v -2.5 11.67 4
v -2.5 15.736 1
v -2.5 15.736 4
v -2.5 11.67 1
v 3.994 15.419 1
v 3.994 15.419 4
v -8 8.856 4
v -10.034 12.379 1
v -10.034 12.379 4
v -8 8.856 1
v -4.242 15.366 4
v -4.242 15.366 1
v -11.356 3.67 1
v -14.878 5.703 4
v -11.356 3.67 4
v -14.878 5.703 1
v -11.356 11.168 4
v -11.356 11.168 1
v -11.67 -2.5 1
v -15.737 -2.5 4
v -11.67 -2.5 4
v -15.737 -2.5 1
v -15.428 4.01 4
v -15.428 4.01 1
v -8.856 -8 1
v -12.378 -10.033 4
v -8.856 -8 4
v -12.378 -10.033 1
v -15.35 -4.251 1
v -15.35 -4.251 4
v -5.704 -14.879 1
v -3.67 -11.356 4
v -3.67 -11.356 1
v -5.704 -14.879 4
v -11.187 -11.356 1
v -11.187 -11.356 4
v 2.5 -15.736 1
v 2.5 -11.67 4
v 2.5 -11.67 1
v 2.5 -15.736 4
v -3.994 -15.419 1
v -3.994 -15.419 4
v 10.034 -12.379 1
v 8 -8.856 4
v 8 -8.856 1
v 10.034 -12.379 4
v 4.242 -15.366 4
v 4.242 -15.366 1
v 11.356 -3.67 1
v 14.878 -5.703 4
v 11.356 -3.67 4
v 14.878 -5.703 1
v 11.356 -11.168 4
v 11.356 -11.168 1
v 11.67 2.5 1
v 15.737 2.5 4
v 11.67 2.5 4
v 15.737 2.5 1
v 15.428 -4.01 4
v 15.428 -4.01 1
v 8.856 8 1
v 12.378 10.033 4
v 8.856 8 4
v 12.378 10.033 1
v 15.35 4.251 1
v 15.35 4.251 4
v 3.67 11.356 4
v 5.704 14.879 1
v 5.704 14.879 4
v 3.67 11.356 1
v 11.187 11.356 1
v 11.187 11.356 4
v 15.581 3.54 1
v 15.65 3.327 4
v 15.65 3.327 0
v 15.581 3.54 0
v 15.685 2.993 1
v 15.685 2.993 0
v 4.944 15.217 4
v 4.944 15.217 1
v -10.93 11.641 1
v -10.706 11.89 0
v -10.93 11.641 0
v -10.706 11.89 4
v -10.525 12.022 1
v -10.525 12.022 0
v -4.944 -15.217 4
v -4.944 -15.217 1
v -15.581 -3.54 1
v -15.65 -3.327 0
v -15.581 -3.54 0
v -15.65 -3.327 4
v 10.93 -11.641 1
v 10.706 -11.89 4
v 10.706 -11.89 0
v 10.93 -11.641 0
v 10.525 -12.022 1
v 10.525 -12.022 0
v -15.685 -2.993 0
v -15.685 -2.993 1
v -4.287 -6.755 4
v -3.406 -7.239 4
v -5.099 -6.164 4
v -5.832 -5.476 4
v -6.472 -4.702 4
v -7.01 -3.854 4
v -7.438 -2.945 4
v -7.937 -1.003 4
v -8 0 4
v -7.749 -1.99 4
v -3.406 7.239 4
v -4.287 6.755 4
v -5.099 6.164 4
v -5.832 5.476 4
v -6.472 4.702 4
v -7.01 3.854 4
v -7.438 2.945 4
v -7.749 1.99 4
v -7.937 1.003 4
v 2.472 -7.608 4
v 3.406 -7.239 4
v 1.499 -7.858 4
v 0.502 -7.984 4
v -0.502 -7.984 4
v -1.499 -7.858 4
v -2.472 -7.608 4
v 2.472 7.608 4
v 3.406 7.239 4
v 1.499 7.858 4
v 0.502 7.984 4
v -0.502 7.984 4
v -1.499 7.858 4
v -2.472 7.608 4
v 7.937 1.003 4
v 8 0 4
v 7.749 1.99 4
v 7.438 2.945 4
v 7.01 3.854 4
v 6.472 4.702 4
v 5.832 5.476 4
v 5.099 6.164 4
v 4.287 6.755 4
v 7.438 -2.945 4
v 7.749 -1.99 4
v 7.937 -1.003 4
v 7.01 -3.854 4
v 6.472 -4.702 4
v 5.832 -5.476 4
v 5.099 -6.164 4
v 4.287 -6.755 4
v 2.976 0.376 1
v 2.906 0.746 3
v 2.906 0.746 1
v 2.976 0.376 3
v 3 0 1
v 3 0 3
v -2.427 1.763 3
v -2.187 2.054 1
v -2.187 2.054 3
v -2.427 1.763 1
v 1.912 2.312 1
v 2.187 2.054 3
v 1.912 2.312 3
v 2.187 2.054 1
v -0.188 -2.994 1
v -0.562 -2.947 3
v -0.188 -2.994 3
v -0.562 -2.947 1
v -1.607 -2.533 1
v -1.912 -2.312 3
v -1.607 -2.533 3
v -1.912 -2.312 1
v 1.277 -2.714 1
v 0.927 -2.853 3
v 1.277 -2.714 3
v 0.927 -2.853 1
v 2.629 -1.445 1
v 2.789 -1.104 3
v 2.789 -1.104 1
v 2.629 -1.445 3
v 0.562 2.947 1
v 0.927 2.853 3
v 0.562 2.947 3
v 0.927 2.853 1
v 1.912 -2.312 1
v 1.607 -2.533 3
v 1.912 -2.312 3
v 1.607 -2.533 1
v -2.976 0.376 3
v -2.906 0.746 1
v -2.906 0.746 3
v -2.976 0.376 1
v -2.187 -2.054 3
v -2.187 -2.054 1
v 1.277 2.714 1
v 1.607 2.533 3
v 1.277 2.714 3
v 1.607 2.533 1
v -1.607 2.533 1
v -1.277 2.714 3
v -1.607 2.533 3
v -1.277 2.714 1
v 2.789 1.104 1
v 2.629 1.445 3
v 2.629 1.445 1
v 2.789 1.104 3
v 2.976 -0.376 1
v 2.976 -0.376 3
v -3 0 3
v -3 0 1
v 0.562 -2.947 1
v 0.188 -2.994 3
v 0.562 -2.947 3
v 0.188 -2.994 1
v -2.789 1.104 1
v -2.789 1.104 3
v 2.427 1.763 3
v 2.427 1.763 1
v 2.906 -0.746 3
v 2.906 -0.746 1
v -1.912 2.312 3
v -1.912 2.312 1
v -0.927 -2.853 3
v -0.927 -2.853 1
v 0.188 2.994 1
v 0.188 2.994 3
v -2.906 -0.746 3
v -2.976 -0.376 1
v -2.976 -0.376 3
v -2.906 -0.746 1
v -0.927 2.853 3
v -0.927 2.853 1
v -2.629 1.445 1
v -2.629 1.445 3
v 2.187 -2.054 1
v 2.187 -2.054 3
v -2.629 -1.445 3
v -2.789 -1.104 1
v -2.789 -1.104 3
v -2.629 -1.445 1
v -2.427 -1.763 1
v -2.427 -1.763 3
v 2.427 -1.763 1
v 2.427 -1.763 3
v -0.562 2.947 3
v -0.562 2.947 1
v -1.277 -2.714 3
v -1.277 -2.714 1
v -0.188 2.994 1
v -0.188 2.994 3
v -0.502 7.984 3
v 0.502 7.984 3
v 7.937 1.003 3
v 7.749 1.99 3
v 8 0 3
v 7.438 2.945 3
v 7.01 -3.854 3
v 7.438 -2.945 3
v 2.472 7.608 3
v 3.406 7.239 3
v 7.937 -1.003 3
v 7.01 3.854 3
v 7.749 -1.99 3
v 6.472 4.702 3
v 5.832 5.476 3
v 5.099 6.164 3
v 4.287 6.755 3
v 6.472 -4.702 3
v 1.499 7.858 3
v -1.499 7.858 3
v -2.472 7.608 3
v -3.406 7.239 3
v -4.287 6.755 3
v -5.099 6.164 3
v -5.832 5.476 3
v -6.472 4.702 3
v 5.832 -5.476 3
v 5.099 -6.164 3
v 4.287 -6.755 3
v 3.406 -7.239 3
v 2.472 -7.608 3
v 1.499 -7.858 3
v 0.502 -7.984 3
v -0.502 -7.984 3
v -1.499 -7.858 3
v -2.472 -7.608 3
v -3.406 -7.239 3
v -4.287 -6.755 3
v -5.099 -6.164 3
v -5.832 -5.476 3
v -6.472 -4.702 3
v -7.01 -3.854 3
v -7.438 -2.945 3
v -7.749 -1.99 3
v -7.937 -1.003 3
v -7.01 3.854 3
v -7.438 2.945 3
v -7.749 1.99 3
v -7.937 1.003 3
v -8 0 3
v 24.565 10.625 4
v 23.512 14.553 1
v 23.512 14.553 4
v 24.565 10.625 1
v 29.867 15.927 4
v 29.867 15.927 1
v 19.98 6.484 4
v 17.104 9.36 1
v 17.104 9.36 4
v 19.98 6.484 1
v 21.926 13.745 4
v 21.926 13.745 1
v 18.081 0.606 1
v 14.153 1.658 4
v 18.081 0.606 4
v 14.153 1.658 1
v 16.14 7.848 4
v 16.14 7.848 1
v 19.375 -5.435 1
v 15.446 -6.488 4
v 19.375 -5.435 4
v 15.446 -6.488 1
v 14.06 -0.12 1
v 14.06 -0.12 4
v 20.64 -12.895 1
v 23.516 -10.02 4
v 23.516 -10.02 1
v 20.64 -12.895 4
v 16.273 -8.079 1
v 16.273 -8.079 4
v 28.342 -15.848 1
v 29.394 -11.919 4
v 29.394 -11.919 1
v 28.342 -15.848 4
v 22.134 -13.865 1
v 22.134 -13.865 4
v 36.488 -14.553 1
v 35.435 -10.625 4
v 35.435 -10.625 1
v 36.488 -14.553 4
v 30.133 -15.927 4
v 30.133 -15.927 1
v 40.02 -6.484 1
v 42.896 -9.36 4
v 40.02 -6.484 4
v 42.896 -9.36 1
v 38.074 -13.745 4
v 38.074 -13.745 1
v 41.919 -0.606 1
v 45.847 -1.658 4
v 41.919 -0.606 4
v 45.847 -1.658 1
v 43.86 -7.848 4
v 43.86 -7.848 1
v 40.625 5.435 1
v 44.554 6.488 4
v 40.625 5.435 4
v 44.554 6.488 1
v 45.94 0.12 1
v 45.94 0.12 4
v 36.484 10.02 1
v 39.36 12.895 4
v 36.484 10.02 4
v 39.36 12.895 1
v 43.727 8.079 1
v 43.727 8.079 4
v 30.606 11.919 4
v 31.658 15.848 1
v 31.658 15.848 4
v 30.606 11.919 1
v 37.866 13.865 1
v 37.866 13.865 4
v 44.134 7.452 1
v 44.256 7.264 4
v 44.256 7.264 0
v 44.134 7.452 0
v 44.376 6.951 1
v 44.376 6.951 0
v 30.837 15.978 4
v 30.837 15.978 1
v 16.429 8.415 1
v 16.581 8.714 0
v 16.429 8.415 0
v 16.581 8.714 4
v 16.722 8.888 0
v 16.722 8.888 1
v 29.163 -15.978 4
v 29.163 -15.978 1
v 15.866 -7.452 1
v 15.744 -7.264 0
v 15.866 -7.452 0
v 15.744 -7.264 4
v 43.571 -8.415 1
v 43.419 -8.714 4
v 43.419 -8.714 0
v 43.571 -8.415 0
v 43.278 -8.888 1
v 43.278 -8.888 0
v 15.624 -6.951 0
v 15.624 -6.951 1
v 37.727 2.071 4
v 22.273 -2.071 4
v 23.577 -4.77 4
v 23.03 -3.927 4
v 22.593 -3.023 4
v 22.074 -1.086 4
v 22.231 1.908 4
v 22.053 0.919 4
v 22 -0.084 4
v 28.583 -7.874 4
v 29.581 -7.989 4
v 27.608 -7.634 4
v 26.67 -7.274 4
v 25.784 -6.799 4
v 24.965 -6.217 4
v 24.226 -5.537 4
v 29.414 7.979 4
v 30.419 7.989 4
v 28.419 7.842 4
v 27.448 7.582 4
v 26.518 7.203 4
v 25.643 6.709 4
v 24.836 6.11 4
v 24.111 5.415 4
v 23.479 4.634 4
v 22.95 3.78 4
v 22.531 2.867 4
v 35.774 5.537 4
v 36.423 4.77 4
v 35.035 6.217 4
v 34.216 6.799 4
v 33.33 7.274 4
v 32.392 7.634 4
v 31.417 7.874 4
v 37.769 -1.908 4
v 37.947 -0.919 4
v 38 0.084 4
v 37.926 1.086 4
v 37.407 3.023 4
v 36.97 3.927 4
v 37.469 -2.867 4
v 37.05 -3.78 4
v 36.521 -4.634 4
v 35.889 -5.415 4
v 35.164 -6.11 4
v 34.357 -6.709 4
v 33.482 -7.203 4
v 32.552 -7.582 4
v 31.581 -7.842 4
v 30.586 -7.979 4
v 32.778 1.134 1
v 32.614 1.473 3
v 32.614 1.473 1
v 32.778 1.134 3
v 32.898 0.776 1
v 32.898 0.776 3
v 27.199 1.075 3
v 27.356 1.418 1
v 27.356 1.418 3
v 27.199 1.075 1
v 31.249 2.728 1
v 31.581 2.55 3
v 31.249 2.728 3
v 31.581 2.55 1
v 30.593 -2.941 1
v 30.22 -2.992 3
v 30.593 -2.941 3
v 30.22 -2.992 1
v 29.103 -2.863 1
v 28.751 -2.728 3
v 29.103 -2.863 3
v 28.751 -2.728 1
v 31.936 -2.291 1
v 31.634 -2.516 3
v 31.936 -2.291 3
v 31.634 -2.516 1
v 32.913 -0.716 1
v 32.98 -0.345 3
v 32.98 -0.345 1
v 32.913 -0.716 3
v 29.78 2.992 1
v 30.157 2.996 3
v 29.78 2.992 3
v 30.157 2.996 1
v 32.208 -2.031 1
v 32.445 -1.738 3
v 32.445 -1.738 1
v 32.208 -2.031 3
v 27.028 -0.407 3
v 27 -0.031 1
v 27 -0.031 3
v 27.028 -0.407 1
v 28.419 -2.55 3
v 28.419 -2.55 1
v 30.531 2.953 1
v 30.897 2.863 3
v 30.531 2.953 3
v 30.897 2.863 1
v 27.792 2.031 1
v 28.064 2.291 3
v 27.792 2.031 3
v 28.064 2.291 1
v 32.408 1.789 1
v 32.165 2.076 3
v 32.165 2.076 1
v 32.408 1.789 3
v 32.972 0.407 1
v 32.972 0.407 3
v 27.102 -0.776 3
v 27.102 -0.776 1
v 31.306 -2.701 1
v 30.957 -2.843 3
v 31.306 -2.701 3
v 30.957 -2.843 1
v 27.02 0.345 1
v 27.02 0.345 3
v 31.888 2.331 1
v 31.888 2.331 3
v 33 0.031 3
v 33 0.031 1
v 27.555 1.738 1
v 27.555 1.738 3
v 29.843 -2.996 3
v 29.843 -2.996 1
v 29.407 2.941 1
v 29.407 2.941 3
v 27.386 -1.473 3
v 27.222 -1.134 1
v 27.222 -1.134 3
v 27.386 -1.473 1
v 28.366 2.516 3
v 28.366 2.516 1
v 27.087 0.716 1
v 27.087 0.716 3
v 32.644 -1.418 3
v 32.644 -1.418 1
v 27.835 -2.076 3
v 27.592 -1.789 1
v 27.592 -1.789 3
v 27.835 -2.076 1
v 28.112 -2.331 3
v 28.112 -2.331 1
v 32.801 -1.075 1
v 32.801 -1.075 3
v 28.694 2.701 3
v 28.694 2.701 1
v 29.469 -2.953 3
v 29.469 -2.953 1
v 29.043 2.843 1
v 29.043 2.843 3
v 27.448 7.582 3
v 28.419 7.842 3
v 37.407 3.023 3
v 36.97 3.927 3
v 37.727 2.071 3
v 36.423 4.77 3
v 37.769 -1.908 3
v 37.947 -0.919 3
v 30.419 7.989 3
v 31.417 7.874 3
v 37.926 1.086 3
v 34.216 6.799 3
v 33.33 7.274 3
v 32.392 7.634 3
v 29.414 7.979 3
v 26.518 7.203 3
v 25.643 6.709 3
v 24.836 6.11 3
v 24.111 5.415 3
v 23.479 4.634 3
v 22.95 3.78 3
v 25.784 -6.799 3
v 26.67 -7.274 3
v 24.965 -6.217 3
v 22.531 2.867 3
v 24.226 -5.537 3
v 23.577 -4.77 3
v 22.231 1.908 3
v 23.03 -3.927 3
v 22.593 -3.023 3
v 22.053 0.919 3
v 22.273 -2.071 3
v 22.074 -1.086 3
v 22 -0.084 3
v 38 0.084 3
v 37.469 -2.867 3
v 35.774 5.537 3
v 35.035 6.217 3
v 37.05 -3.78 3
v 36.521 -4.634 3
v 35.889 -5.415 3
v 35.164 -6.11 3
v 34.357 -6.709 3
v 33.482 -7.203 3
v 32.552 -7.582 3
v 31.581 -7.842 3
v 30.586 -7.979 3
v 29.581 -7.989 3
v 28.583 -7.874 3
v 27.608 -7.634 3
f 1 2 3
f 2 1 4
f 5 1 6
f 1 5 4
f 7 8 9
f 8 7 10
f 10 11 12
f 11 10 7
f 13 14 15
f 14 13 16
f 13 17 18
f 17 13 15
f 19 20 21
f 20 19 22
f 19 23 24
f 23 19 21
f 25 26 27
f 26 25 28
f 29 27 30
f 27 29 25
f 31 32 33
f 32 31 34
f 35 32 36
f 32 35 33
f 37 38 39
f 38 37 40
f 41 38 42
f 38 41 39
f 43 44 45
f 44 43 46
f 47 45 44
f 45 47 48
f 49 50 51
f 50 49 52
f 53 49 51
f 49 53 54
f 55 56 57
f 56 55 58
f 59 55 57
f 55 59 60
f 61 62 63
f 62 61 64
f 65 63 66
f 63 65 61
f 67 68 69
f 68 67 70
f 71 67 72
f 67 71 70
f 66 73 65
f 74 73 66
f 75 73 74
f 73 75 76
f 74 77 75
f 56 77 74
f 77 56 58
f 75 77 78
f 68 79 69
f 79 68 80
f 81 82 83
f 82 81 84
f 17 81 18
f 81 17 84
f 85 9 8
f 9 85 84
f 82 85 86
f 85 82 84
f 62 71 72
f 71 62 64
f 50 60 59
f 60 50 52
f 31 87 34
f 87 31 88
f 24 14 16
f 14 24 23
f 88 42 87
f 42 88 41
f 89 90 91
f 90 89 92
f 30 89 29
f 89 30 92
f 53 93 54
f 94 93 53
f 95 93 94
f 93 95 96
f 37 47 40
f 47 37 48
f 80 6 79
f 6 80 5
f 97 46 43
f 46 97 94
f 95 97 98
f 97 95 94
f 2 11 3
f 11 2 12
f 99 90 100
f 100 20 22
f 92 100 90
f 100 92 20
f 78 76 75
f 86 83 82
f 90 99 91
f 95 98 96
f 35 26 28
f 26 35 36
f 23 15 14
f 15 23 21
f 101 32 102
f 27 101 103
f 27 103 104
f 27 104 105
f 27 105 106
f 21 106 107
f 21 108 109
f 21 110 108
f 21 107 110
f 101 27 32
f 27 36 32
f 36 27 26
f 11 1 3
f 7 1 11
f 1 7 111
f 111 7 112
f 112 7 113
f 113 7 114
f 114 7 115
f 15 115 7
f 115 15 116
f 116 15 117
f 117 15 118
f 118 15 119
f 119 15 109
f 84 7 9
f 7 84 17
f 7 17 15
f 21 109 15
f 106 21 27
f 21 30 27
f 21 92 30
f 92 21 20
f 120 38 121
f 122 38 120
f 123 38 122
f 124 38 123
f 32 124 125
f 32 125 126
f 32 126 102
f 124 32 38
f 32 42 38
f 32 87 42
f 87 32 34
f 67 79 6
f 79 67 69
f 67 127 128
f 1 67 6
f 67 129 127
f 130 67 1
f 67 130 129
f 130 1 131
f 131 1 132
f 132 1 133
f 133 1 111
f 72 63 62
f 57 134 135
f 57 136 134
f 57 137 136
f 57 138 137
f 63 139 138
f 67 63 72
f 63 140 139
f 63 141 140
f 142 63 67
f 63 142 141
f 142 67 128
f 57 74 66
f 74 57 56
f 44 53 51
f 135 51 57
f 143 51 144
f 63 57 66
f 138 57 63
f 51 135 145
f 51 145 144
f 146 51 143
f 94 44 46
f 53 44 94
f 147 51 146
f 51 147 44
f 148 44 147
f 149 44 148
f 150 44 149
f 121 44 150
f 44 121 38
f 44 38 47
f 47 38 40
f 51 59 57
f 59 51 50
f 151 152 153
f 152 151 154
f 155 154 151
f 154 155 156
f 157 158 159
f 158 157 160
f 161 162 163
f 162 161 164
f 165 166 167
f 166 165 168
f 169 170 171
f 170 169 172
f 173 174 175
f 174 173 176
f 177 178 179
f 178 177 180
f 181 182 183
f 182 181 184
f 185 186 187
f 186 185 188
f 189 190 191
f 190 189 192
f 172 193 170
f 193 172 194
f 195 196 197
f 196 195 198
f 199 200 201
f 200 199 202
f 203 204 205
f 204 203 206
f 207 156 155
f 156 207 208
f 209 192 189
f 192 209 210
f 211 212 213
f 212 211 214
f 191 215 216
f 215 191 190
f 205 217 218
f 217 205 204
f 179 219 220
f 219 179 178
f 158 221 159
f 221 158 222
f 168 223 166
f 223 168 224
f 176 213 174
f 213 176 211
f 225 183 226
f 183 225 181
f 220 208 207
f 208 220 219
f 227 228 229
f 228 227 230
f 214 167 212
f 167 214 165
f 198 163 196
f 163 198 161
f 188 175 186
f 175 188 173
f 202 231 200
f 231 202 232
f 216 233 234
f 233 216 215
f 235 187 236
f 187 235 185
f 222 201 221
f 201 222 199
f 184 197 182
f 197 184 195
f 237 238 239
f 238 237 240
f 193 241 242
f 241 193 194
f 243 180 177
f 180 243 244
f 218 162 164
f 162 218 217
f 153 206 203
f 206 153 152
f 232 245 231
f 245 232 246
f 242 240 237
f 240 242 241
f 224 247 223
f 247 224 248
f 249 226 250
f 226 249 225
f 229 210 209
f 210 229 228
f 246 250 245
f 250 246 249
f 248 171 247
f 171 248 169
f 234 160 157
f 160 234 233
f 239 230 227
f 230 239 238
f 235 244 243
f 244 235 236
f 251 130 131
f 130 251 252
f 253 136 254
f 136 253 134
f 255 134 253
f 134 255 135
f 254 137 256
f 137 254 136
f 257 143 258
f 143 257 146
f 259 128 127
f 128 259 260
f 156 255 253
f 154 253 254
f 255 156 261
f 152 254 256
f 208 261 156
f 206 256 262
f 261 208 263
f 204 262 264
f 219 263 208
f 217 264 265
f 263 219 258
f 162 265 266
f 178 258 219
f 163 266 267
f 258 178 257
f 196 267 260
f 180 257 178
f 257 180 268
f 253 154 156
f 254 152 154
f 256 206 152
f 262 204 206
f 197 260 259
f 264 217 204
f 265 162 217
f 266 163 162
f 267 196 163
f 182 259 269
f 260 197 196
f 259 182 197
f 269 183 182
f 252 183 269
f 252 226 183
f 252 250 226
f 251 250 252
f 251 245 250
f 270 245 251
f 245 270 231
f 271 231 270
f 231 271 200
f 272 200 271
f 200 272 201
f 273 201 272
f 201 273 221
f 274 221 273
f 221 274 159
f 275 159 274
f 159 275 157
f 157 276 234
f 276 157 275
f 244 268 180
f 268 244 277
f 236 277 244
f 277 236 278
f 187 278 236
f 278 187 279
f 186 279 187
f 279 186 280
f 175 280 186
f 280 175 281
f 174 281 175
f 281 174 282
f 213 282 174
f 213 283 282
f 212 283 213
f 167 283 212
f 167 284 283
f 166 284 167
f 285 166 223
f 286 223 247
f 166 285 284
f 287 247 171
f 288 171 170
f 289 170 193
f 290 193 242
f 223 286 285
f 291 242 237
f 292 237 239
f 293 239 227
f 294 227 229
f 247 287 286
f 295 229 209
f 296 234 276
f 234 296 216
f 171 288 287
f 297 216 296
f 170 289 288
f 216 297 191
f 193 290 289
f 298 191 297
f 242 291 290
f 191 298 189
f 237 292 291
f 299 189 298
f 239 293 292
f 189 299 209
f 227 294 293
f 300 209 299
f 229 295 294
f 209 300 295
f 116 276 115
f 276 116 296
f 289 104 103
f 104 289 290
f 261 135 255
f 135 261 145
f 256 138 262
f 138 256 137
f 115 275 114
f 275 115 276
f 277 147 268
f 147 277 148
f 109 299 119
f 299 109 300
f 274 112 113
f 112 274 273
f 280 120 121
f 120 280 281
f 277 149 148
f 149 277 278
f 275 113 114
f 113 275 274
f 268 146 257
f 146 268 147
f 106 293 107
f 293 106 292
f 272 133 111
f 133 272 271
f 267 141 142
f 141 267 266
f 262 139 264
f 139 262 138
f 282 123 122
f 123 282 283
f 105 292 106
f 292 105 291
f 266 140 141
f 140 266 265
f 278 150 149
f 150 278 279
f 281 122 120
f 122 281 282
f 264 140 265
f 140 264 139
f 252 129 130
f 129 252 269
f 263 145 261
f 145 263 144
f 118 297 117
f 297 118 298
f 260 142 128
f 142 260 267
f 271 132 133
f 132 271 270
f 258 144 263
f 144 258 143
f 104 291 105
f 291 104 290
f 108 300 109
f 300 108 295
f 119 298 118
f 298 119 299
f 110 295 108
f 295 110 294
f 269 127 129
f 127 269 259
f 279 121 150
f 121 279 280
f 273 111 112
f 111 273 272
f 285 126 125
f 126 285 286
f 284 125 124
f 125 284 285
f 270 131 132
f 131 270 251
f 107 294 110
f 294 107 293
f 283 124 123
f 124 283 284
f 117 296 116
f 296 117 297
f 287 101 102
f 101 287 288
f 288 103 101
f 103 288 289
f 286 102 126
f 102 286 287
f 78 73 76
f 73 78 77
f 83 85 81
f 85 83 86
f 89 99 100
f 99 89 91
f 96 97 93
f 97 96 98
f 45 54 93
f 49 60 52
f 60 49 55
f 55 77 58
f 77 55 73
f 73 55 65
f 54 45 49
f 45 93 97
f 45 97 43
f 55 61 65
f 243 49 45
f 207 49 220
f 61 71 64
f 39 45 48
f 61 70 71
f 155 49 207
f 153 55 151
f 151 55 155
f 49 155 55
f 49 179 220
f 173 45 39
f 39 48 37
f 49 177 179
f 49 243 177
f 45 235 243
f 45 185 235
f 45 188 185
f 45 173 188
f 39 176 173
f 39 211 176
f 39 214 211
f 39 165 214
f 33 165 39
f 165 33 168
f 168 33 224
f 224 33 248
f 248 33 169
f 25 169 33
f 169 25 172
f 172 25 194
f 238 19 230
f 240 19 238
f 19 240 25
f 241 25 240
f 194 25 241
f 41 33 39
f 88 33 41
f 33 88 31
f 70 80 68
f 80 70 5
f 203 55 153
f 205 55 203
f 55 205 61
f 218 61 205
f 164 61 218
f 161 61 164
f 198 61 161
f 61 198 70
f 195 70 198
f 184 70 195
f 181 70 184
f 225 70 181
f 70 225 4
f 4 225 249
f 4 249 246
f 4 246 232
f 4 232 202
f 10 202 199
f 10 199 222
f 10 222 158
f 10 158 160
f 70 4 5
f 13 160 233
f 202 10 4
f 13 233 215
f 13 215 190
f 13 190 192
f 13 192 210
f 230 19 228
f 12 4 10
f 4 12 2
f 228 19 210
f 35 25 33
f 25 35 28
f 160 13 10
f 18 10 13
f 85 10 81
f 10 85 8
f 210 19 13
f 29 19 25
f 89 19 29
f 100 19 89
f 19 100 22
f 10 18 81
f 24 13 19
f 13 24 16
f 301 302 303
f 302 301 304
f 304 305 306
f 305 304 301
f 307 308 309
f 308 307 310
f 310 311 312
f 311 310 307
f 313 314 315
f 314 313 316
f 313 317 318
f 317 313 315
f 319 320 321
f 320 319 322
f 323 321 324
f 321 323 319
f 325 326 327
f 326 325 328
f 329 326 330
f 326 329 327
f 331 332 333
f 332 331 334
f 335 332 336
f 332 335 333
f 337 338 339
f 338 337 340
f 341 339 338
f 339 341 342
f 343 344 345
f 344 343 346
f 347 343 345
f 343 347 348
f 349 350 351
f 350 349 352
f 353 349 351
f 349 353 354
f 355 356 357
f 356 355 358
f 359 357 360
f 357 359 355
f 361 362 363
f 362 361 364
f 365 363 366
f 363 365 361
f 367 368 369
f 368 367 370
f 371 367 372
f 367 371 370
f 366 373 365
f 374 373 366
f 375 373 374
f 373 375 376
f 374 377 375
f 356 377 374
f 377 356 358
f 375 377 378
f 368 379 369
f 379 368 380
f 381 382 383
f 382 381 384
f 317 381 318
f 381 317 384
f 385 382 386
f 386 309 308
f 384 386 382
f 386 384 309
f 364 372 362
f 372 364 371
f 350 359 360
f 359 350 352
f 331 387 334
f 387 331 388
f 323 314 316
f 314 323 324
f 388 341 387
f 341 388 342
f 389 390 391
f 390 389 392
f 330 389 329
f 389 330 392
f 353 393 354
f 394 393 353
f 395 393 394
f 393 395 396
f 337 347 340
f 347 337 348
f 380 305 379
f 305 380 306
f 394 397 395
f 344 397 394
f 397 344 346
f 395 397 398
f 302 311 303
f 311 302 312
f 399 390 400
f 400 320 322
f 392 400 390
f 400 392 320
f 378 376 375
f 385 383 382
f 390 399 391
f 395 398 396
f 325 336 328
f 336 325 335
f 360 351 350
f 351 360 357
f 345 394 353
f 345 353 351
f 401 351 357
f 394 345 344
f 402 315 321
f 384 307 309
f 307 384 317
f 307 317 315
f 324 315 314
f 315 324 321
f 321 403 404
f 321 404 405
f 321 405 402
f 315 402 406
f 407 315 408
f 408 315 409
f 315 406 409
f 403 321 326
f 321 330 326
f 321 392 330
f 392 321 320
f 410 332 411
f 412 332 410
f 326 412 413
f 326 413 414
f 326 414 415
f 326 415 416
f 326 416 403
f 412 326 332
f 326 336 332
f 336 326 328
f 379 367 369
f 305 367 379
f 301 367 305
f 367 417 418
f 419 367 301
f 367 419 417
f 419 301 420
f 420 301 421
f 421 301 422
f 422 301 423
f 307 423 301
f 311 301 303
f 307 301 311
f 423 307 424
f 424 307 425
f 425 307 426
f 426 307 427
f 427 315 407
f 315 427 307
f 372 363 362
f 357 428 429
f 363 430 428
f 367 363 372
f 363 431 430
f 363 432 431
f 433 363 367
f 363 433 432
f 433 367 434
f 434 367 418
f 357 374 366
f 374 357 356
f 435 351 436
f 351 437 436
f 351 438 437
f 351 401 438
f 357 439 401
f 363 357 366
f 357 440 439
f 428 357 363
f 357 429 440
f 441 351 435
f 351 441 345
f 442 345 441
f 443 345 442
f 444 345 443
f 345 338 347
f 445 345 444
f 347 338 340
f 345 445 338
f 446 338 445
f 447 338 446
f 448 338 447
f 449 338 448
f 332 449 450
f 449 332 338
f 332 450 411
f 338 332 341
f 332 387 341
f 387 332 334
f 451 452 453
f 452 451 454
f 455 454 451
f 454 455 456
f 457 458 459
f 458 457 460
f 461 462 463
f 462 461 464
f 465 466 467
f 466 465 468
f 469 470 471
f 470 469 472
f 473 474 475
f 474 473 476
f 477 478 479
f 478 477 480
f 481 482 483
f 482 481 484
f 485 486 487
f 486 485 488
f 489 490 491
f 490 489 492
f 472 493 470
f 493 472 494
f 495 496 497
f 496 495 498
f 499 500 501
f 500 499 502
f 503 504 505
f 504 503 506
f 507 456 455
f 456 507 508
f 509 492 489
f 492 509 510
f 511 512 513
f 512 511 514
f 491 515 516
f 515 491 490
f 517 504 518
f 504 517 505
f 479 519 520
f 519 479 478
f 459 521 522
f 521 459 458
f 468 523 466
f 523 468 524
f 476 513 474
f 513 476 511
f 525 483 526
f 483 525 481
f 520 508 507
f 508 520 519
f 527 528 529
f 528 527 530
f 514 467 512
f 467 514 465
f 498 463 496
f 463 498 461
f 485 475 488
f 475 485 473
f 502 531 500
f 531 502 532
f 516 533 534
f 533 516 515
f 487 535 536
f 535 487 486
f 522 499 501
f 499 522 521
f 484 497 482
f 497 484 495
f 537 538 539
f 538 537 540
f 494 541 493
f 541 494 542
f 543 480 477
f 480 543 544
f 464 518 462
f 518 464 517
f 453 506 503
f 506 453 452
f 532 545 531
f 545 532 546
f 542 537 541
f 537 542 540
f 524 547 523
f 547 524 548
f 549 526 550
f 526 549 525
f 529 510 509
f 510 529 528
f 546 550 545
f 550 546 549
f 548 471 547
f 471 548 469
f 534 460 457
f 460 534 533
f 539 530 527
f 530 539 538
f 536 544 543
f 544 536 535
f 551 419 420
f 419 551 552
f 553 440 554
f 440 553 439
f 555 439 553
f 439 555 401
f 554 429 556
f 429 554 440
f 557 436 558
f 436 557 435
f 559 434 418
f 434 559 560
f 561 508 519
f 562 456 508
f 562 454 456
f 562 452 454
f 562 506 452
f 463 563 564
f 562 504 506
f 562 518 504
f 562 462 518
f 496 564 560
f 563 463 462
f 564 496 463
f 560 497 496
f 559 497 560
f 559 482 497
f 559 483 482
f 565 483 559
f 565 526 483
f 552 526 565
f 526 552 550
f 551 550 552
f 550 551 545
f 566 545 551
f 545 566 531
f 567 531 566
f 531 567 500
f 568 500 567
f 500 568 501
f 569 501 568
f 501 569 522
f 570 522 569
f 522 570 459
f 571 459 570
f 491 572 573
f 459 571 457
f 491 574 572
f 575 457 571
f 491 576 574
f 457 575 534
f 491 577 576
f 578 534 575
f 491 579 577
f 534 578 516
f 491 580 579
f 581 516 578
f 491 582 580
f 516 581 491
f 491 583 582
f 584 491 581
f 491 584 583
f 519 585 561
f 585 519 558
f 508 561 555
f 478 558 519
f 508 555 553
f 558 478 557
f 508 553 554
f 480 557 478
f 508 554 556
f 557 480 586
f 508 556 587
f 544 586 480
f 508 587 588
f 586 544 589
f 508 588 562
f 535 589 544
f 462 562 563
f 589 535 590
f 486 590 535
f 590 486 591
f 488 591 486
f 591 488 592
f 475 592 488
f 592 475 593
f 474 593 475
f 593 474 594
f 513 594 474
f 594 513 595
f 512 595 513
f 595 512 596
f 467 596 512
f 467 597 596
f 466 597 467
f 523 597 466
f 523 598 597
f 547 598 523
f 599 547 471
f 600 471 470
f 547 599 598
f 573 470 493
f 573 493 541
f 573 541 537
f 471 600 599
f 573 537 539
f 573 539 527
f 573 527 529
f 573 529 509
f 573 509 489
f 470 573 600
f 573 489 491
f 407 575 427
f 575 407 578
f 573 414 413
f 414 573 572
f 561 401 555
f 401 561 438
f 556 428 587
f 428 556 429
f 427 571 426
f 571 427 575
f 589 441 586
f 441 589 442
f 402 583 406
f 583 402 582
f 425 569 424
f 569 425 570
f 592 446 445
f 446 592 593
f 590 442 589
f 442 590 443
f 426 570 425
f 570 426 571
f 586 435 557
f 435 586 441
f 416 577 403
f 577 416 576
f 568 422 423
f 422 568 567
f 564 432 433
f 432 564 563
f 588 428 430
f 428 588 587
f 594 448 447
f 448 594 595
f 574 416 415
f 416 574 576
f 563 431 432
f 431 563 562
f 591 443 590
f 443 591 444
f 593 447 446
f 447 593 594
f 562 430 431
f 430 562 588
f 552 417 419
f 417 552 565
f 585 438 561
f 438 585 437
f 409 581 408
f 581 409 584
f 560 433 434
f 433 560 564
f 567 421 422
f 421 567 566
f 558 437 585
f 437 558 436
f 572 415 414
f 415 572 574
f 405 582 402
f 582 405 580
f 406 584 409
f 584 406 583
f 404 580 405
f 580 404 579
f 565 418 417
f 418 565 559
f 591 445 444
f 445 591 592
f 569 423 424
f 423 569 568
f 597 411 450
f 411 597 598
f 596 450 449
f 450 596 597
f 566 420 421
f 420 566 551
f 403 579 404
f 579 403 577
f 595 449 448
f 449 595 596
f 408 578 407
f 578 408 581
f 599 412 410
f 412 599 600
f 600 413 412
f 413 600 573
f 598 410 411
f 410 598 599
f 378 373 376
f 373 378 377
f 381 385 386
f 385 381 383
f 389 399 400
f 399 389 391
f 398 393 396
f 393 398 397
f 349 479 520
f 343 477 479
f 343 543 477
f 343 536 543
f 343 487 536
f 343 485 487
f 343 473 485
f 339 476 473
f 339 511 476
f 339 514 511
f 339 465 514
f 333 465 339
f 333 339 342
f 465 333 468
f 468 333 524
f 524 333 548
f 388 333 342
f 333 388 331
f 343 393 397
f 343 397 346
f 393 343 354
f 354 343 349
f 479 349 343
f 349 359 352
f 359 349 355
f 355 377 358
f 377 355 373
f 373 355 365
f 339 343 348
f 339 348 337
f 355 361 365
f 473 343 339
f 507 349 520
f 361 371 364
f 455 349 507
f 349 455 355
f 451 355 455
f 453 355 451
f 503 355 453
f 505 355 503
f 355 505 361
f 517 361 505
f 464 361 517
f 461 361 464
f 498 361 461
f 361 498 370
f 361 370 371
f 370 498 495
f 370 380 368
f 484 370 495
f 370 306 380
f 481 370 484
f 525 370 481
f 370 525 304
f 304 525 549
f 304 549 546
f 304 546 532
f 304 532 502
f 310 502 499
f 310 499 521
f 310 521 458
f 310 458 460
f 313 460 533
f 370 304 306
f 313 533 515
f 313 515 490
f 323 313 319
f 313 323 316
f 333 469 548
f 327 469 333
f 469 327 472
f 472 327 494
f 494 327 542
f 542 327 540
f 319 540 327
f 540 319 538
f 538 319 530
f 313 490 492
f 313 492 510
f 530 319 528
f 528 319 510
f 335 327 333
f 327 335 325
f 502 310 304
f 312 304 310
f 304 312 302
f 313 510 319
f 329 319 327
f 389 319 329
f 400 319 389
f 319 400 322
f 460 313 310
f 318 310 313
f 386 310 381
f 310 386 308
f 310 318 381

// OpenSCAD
thick = 4;
over = 0.5;
etch = 1;
comb = thick + over;
ax = 3;

module gear(gear_size) {
    difference() {
        cylinder(h=thick, r=gear_size);
        
        for(angle=[0:30:350]) {
            rotate([0,0,angle]) {
                translate([0,16,-over/2]) {
                    cylinder(h=comb, r=5, $fn=1);
                }
            }
        }
     
        translate([0,0,-5]) {
            cylinder(h=thick*3, r=ax, $fn=50);
        }
        translate([0,0,thick-etch]) {
            cylinder(h=thick, r=gear_size/2, $fn=50);
        }
        translate([0,0,-(thick-etch)]) {
           cylinder(h=thick, r=gear_size, $fn=50);
        }
    }
}

gear(16);
translate([30,0,0]) {
    rotate([0,0, 15]) {
        gear(16);
    }
}
